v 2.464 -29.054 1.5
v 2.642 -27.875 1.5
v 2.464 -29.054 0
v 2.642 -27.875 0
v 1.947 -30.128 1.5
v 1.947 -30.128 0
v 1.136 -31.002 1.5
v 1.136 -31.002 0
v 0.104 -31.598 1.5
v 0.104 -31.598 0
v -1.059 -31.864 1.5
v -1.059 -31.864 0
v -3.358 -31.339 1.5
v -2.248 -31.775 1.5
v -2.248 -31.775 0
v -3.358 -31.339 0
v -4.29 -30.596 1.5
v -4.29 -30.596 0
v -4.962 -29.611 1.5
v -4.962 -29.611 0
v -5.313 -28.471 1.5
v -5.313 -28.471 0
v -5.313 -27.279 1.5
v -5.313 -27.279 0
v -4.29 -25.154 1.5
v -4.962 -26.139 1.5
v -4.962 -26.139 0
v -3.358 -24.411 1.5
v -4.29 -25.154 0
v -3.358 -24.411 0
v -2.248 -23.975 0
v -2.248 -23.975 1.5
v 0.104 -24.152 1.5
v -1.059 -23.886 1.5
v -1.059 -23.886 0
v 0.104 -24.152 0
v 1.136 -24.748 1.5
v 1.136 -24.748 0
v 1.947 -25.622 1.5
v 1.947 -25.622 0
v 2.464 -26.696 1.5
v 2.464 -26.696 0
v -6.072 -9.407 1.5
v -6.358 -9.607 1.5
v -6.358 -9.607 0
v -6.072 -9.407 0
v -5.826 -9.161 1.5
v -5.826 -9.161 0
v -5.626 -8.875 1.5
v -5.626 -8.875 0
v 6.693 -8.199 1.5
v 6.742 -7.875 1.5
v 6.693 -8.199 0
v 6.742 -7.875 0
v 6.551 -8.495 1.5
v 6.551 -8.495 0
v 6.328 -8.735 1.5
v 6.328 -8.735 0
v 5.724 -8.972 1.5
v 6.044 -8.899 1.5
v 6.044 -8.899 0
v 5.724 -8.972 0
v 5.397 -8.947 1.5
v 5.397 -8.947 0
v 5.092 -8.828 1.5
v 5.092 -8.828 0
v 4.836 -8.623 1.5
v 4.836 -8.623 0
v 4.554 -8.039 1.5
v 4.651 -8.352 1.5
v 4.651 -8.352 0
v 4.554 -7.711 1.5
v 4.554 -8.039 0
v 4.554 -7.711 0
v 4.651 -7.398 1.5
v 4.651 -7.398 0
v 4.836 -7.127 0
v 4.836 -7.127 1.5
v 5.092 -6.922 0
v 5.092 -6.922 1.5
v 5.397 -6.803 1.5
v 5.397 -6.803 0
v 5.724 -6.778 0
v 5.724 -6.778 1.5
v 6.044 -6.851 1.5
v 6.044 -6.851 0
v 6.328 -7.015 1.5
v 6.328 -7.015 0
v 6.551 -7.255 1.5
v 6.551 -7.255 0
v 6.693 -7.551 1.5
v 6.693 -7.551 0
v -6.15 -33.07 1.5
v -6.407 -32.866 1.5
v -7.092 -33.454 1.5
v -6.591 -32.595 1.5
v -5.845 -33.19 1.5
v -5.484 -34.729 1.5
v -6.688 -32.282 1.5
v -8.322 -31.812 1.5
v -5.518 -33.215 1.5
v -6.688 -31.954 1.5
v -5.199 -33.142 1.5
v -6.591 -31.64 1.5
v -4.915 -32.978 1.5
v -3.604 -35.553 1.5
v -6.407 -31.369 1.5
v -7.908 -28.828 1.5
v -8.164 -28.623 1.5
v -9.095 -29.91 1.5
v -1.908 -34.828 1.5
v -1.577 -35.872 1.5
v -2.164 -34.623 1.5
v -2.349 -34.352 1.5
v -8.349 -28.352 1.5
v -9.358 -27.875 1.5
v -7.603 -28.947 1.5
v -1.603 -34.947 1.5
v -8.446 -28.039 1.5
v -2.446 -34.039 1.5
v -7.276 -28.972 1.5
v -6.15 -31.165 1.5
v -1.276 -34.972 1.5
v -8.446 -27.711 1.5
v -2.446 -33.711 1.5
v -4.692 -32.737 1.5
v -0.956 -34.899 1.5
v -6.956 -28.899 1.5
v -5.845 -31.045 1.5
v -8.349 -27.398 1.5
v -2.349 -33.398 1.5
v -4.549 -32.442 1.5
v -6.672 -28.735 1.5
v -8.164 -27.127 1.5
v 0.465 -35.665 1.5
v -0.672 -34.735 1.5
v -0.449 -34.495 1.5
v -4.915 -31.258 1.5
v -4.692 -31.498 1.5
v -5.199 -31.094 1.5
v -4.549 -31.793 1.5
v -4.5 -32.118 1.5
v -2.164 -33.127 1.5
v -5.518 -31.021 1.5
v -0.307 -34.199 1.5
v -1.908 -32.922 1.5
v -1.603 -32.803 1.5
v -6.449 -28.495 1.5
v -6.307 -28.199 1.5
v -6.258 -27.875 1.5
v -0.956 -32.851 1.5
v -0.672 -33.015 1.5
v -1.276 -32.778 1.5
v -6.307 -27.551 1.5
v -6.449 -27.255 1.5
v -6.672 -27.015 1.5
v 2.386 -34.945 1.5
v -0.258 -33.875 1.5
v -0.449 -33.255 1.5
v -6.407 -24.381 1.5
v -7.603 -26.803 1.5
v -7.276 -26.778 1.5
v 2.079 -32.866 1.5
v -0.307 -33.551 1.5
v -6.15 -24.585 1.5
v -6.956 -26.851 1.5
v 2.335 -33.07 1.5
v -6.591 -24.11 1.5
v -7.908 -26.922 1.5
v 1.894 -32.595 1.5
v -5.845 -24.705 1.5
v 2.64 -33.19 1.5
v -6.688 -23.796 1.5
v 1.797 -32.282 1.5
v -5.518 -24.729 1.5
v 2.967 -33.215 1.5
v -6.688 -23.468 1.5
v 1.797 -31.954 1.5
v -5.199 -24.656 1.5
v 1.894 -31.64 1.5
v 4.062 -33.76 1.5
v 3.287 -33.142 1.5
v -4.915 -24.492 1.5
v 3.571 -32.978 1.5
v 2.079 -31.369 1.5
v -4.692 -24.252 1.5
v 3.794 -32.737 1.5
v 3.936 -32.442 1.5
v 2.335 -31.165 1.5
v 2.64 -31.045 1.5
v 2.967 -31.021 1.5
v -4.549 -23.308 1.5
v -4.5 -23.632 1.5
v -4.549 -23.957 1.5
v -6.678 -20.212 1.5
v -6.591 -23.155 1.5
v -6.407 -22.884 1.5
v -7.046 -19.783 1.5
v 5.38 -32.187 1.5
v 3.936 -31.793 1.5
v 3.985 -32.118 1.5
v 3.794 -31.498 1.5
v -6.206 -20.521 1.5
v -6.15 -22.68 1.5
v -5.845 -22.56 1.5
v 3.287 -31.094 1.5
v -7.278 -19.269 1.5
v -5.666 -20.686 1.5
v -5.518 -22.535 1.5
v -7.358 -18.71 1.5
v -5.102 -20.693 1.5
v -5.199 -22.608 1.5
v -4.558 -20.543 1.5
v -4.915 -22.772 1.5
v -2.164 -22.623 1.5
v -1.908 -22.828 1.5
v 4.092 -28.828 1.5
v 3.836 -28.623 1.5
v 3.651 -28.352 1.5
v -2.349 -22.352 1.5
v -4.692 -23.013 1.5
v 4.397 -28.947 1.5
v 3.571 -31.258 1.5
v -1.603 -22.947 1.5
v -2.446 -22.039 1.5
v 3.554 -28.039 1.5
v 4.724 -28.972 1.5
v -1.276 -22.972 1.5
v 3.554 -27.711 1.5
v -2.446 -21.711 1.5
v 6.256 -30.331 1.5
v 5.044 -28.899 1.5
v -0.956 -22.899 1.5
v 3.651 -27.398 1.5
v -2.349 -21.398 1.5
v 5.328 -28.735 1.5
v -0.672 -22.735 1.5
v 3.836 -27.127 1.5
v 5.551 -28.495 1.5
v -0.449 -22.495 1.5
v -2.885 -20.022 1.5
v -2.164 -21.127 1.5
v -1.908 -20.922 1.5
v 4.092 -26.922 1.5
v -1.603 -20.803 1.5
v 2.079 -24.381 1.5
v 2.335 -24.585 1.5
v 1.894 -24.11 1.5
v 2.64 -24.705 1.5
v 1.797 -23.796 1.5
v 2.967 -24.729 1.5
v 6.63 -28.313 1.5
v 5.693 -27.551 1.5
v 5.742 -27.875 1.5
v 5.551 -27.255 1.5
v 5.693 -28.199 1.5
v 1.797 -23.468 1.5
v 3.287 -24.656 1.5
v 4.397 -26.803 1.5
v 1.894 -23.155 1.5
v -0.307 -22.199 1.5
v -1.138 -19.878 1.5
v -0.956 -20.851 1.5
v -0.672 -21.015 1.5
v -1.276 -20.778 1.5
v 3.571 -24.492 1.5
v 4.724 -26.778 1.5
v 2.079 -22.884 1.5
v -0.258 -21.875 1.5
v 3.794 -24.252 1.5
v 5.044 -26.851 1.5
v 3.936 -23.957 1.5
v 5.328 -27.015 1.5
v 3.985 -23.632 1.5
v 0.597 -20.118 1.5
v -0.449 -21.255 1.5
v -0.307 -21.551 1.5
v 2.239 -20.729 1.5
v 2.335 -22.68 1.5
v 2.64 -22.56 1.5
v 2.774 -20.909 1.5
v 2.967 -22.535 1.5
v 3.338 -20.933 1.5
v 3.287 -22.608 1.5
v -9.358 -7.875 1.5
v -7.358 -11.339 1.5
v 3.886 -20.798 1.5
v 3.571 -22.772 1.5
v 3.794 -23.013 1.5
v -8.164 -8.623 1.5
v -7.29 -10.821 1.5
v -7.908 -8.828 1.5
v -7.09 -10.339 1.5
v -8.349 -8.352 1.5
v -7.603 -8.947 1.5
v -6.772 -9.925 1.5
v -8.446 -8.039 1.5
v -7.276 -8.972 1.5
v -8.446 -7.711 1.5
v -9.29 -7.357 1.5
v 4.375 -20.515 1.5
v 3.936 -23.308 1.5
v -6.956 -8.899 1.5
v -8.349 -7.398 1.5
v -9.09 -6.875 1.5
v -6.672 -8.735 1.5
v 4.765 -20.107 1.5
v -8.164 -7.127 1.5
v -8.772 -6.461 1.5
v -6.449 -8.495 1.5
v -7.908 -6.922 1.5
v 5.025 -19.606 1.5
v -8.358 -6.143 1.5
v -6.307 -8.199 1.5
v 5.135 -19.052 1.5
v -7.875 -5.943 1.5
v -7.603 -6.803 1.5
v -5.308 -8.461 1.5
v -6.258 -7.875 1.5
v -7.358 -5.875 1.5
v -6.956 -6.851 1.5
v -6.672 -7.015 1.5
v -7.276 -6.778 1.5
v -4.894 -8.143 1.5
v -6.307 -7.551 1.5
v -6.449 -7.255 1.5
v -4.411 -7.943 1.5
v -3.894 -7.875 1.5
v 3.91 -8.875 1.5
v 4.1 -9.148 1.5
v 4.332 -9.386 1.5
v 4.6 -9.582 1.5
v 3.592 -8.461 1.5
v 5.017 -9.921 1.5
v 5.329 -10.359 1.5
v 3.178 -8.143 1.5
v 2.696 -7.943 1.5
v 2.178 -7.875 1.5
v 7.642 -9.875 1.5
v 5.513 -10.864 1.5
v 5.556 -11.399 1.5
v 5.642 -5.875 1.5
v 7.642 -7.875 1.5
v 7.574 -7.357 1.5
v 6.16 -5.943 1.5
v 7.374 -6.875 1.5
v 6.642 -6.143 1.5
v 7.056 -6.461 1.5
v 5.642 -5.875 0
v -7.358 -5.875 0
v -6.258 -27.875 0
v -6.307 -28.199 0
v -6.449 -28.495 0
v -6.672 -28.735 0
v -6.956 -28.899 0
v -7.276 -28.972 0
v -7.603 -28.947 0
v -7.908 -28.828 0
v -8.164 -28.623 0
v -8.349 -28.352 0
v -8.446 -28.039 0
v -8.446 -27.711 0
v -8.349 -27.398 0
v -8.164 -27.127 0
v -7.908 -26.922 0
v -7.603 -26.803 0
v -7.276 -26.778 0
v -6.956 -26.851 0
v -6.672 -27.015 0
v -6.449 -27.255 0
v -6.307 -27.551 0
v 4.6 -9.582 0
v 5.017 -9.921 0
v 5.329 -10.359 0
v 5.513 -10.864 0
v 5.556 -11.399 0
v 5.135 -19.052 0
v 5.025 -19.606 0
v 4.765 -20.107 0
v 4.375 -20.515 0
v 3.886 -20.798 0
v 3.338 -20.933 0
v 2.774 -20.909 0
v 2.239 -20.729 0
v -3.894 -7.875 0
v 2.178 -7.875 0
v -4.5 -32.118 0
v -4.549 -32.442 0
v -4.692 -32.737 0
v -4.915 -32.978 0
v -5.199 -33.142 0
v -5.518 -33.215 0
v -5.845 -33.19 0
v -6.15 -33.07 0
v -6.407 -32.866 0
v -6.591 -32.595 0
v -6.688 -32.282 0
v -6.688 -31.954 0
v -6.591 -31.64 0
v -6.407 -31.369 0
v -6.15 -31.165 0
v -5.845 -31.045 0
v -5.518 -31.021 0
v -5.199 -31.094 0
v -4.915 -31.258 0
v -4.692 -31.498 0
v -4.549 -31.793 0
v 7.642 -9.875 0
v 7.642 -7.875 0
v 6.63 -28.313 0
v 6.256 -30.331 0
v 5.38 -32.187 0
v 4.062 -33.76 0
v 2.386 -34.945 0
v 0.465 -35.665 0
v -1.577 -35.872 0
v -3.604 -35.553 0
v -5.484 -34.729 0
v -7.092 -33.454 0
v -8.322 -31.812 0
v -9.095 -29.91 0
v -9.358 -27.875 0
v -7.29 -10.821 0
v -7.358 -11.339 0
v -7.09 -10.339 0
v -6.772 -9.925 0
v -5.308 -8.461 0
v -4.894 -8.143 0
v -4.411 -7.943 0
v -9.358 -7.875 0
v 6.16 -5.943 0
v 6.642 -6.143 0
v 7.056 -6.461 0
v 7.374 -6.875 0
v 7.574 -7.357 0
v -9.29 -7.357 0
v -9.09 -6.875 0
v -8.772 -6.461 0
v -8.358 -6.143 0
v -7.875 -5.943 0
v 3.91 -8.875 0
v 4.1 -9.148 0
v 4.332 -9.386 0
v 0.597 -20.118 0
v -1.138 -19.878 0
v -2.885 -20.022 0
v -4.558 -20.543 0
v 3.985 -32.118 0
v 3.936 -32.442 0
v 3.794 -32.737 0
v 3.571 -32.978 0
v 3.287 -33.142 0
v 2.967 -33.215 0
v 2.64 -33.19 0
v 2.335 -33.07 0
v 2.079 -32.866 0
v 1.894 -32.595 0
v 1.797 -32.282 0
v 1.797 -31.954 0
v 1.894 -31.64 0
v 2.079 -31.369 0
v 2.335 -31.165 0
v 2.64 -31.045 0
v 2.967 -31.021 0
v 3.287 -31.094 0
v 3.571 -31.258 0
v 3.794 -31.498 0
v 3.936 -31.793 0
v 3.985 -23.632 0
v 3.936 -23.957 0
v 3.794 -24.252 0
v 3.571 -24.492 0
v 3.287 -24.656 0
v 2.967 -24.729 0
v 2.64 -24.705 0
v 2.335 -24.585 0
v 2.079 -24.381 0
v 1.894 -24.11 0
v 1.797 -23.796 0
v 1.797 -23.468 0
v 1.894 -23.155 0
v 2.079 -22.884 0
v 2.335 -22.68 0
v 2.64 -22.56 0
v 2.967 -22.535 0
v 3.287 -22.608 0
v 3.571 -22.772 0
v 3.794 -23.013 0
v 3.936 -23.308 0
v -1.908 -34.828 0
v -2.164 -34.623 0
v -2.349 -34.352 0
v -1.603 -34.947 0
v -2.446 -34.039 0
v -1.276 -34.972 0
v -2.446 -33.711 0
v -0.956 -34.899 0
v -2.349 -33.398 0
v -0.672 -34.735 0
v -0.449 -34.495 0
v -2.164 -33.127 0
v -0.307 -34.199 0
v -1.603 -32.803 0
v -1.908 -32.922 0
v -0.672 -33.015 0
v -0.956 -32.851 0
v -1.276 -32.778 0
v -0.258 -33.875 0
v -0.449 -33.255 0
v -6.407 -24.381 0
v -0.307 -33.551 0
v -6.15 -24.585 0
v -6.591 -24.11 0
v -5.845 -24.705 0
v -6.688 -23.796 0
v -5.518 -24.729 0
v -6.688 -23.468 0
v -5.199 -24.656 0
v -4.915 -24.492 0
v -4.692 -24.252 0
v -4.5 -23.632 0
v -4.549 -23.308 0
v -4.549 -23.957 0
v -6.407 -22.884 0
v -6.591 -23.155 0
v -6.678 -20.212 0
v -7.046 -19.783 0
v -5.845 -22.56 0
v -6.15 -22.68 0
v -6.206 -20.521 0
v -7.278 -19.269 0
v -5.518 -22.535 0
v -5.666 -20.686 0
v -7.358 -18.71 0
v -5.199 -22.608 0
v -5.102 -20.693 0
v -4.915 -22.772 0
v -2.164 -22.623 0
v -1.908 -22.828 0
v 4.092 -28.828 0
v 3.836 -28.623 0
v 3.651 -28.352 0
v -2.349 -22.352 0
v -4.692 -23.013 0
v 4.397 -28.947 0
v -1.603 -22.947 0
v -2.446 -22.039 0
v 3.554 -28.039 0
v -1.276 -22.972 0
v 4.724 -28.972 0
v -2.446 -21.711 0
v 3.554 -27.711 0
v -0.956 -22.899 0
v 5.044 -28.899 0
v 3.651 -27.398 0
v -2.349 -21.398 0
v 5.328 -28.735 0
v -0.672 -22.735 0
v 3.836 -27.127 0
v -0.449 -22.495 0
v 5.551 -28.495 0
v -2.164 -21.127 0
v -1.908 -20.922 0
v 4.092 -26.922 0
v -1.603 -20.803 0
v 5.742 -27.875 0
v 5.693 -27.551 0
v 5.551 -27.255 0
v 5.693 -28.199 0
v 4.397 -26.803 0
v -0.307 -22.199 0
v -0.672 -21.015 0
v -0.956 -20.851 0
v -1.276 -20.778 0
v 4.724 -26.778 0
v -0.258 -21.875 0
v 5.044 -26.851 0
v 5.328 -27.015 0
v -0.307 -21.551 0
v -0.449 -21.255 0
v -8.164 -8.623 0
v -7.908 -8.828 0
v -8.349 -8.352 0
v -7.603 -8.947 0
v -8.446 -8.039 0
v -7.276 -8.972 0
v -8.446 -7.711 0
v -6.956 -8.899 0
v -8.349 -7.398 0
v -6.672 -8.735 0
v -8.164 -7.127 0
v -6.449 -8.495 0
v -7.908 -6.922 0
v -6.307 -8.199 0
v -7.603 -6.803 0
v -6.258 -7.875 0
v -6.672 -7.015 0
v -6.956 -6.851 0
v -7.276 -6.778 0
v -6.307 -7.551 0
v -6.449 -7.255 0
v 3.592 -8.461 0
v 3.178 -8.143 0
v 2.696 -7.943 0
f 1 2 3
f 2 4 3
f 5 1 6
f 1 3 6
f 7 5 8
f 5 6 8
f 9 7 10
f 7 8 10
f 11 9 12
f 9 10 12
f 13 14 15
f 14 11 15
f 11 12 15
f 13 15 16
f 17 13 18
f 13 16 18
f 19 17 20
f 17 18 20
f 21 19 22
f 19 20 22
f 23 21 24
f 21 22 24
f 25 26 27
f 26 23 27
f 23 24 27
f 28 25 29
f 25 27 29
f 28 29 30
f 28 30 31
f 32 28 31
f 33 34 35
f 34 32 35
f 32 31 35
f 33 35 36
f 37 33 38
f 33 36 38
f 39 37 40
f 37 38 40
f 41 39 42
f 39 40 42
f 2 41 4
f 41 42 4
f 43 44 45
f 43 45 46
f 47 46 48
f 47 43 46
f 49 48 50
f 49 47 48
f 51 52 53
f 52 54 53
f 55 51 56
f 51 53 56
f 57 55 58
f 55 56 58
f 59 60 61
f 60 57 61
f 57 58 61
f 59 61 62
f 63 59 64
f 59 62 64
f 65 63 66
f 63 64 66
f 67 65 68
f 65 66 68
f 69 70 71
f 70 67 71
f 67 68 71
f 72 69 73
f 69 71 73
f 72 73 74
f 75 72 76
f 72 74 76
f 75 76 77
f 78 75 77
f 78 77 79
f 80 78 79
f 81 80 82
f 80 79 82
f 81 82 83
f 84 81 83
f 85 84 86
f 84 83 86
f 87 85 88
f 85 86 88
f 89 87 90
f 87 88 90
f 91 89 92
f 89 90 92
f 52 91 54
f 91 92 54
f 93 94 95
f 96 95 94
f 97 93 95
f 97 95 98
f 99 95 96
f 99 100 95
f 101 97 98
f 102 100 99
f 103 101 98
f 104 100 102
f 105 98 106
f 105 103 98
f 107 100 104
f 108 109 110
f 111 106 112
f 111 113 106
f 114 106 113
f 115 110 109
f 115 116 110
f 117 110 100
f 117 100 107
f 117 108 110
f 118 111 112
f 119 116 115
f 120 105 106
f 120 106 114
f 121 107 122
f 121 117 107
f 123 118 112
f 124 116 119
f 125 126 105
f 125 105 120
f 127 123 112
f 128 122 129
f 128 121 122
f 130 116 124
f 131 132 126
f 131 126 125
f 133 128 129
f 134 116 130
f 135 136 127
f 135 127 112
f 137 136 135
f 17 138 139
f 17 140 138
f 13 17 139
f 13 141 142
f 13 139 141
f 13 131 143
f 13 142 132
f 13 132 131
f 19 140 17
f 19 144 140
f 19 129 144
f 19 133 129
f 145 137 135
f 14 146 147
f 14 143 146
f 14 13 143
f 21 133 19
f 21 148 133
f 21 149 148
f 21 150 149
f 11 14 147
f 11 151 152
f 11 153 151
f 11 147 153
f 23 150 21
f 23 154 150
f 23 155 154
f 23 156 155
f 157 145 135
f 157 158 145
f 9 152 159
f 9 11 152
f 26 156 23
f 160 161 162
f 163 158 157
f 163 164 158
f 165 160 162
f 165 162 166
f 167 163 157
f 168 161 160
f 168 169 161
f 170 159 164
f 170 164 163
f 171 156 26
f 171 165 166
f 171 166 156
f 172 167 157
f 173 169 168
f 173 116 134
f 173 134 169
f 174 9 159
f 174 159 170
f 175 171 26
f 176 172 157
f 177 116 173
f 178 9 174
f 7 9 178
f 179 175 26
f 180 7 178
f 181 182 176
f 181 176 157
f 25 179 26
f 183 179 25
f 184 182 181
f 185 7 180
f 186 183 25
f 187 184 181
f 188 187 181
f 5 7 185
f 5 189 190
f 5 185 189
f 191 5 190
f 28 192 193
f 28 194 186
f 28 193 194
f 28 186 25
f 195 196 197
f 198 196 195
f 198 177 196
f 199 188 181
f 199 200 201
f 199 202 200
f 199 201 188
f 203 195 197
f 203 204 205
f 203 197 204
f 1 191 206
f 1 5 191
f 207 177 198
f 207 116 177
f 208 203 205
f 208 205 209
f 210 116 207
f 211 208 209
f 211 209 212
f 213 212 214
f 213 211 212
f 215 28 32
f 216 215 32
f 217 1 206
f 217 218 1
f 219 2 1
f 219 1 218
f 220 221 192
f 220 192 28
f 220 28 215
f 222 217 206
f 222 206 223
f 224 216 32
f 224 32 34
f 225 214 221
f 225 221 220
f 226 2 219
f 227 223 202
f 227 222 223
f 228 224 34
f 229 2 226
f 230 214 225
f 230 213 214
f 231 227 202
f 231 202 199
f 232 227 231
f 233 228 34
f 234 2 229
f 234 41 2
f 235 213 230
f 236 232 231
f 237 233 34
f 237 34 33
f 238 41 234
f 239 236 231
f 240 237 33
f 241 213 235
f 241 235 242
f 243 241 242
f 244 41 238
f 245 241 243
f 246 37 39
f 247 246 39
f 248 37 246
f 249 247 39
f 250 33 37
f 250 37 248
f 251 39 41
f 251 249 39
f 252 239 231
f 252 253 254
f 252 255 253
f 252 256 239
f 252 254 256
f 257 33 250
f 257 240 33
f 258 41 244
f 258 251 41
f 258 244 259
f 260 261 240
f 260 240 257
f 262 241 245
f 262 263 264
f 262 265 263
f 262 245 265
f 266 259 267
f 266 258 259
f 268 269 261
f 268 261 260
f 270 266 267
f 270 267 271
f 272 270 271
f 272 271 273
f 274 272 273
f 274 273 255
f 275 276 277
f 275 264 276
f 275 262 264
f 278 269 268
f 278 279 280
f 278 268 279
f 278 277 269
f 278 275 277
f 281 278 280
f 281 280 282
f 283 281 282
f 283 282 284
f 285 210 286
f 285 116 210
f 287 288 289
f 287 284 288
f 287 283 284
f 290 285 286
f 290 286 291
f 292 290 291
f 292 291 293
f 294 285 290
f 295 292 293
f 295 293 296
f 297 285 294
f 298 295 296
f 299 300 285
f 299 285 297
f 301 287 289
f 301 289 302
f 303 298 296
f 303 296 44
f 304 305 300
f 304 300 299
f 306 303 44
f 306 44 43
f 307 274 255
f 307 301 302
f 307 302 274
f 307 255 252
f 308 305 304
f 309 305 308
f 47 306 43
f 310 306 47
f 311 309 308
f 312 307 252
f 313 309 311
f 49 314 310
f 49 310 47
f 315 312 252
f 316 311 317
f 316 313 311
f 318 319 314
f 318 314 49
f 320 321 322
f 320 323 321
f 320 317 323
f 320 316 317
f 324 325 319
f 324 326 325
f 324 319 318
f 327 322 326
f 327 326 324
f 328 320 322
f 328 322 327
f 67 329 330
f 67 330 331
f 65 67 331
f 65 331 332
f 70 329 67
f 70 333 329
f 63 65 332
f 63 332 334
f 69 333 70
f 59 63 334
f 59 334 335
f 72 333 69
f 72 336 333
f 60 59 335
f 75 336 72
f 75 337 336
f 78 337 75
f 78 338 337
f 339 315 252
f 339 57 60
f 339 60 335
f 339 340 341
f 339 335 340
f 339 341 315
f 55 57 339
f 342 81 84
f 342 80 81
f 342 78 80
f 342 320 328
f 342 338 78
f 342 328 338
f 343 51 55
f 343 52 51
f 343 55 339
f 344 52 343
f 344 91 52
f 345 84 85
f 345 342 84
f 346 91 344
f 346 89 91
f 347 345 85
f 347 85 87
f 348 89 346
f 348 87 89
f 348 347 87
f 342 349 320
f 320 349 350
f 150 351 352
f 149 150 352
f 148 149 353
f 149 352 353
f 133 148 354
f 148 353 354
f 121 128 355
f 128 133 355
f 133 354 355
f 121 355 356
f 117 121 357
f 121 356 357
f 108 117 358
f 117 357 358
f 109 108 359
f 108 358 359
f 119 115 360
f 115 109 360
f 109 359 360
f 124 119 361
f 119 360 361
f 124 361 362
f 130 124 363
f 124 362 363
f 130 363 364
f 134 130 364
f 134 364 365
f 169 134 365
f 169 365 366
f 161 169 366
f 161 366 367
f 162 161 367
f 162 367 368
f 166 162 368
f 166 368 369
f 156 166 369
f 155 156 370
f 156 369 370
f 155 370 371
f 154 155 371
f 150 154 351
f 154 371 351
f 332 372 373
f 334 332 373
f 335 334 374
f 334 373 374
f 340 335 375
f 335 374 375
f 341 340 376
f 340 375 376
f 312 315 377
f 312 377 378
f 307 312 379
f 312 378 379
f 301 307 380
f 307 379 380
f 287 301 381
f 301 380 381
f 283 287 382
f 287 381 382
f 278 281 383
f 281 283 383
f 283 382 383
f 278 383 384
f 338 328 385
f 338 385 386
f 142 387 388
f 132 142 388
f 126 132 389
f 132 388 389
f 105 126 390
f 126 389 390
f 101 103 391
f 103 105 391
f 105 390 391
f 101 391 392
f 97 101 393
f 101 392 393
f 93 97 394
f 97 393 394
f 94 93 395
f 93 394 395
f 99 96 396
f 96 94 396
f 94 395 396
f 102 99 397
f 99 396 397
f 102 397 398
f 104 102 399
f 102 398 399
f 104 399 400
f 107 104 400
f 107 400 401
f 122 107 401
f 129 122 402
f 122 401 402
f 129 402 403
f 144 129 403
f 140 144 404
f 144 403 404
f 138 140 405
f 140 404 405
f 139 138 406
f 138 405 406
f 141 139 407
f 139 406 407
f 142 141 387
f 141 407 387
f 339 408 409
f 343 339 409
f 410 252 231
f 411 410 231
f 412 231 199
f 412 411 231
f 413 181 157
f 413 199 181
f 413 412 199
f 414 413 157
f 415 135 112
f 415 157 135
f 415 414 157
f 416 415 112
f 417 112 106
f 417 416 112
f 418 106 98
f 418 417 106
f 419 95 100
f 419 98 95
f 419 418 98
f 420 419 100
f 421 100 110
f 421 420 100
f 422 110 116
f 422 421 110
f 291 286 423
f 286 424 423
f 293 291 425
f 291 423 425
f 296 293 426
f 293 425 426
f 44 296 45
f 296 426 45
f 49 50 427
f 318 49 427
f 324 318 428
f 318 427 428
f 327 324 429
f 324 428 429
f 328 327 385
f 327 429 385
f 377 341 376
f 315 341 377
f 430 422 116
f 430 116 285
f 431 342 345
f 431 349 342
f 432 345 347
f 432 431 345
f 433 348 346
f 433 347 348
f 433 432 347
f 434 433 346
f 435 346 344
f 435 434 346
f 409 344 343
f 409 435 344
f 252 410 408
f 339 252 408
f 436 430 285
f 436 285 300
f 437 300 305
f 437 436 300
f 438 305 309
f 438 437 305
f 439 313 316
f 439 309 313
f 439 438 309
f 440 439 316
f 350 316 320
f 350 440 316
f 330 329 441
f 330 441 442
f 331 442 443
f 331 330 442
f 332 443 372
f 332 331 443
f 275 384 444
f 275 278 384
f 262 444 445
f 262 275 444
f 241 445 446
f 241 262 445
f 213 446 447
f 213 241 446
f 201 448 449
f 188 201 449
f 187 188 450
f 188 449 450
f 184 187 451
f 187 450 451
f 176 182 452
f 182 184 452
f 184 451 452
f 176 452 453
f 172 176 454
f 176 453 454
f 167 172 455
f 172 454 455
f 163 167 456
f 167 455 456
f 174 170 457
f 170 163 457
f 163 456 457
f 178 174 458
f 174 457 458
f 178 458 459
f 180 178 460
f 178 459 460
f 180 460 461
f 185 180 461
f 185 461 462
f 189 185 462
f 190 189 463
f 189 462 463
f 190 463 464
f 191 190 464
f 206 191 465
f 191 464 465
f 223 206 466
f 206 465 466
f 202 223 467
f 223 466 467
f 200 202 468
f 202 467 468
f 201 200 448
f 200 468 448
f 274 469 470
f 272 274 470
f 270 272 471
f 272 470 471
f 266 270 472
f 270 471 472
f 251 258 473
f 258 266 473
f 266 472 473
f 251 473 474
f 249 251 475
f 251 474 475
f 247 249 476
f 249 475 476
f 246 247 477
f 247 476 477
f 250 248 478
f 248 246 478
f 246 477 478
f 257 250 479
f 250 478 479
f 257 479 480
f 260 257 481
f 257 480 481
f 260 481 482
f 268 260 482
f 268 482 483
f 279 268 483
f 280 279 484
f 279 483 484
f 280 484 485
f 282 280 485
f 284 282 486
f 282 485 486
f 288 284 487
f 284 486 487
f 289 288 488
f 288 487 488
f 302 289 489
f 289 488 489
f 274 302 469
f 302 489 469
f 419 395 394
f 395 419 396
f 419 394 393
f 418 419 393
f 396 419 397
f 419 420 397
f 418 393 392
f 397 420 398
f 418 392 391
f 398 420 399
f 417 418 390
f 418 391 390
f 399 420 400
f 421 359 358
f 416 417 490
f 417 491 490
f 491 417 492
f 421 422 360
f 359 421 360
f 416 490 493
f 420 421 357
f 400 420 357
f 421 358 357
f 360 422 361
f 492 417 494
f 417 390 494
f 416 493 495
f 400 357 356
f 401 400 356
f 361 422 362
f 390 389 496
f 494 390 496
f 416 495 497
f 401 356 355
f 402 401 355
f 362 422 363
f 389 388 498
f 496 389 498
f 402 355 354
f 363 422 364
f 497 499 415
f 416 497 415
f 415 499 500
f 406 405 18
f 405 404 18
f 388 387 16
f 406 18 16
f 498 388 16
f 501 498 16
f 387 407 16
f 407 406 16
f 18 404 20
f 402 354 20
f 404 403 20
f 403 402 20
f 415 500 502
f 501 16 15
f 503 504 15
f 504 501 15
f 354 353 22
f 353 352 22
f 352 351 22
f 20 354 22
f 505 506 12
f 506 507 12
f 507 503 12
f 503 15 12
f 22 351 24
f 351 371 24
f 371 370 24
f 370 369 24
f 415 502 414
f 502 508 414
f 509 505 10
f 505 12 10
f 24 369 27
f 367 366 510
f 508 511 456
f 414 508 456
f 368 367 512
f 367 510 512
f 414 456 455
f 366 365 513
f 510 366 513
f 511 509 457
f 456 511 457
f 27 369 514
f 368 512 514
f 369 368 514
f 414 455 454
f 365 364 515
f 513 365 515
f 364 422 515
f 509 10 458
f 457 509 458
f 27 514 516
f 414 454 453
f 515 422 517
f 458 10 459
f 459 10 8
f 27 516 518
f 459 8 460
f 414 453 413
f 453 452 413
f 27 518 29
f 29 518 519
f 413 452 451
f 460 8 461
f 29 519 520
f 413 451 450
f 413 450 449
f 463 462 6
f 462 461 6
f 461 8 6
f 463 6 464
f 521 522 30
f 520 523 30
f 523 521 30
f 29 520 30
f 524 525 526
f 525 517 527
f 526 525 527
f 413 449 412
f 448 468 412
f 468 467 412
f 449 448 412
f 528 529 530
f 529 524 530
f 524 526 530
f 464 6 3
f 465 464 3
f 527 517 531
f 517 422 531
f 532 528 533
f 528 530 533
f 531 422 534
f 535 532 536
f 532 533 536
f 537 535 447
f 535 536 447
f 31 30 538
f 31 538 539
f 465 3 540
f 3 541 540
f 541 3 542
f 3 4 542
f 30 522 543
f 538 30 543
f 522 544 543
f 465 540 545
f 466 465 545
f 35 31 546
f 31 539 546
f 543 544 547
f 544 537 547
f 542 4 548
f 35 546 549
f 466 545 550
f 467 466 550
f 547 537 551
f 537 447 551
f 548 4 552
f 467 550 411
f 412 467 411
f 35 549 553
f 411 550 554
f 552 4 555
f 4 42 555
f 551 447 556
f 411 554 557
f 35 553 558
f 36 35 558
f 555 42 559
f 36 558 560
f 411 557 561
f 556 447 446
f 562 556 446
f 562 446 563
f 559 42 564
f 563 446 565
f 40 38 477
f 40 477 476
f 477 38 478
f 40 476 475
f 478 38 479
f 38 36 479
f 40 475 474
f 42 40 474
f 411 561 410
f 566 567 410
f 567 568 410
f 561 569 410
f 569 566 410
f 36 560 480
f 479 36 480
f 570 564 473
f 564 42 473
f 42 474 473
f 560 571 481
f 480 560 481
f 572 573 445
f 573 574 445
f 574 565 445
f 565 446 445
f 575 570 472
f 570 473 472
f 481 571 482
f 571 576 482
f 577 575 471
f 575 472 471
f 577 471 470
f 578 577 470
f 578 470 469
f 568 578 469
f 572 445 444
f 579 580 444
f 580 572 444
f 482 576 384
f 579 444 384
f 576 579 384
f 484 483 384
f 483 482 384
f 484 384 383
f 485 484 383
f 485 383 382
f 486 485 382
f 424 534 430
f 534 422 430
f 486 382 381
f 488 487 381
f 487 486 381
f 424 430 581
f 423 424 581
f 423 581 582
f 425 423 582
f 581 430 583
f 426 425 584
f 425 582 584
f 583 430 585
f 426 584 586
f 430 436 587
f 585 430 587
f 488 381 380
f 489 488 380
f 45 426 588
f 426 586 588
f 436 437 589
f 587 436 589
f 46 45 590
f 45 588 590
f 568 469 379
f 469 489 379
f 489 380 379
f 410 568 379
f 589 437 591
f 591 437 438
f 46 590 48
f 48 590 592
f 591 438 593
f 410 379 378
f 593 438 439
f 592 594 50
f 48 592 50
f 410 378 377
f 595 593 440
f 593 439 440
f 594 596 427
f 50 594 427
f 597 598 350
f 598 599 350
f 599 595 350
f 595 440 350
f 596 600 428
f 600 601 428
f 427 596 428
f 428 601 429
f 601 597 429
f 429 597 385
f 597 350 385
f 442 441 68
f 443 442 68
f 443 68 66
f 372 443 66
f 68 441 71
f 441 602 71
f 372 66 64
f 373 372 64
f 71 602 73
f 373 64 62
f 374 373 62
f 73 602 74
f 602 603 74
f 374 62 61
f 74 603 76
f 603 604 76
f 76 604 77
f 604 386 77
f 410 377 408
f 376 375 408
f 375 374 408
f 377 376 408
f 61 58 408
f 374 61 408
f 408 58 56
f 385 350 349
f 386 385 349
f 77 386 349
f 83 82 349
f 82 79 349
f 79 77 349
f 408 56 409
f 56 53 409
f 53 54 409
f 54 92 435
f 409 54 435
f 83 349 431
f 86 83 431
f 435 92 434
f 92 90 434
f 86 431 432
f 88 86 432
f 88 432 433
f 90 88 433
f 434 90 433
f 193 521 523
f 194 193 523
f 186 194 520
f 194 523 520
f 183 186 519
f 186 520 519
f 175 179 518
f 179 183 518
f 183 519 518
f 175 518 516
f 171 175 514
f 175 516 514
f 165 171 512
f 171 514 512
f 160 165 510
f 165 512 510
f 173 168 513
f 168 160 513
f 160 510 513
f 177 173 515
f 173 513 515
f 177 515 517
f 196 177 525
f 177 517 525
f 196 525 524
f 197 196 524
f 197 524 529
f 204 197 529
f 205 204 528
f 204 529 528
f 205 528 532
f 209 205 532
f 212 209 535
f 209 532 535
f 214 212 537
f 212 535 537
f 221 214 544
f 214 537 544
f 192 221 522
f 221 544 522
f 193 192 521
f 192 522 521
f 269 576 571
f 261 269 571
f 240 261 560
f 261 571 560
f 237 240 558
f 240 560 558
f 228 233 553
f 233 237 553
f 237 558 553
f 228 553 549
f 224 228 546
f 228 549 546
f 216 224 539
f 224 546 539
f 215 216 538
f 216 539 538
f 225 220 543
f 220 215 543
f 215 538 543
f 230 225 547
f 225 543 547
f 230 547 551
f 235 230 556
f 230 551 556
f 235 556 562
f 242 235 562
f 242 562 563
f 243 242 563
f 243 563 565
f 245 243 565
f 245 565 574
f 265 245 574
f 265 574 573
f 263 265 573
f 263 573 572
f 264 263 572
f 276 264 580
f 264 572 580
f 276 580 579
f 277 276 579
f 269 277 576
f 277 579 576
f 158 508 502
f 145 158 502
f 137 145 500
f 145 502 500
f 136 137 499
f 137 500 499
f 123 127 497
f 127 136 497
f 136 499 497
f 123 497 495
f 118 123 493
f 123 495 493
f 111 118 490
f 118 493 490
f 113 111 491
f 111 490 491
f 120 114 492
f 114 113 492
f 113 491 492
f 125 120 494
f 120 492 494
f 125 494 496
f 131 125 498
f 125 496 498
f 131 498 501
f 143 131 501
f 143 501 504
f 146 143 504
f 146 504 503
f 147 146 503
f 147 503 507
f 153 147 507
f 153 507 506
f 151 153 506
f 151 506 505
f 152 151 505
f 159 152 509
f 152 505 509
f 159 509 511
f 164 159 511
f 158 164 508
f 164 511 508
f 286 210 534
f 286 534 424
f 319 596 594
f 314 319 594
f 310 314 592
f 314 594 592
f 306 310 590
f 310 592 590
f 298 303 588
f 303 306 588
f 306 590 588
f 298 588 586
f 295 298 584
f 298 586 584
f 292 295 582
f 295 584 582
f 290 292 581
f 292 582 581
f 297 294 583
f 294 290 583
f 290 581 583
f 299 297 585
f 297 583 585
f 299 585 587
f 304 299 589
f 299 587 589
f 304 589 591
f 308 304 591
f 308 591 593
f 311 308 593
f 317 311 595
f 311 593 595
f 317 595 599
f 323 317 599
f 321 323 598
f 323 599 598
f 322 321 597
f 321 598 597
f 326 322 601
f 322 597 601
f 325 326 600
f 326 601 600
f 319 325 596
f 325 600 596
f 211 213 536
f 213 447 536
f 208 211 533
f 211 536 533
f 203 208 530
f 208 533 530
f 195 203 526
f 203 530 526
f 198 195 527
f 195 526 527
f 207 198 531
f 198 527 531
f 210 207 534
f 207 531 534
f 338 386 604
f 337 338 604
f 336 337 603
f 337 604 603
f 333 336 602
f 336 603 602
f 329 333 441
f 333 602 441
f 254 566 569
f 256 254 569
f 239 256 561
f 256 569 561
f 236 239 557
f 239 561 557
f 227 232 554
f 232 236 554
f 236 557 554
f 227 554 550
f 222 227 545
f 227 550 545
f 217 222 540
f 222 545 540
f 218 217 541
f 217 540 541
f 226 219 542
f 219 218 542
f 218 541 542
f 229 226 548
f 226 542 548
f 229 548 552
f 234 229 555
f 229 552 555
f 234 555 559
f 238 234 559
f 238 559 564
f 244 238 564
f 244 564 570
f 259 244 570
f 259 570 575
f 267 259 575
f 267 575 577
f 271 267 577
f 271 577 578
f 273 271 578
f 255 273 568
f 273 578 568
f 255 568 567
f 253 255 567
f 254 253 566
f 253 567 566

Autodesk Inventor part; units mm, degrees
ref_plane "YZ Plane" through (0, 0, 0) normal (1, 0, 0) x (0, 1, 0)
ref_plane "XZ Plane" through (0, 0, 0) normal (0, 1, 0) x (-1, 0, 0)
ref_plane "XY Plane" through (0, 0, 0) normal (0, 0, 1) x (1, 0, 0)
sketch "スケッチ1" plane through (0, 0, 0) normal (0, 0, 1) x (1, 0, 0)
  circle A0 centre (5.6422, -7.875) radius 1 projected
  circle A1 centre (-7.3578, -7.875) radius 1 projected
  circle A2 centre (5.6422, -7.875) radius 1.1
  circle A3 centre (-7.3578, -7.875) radius 1.1
  circle A4 centre (-1.3578, -27.875) radius 4.1 projected
  circle A5 centre (-1.3578, -27.875) radius 4
  circle A6 centre (4.6422, -27.875) radius 1.1
  circle A7 centre (-1.3578, -27.875) radius 6 construction
  circle A8 centre (2.8849, -23.6324) radius 1.1
  circle A9 centre (-1.3578, -21.875) radius 1.1
  circle A10 centre (-5.6004, -23.6324) radius 1.1
  circle A11 centre (-7.3578, -27.875) radius 1.1
  circle A12 centre (-5.6004, -32.1176) radius 1.1
  circle A13 centre (-1.3578, -33.875) radius 1.1
  circle A14 centre (2.8849, -32.1176) radius 1.1
  line L0 (7.6422, -5.875) -> (-9.3578, -5.875)
  line L1 (-9.3578, -5.875) -> (-9.3578, -9.875)
  line L2 (-9.3578, -9.875) -> (7.6422, -9.875)
  line L3 (7.6422, -9.875) -> (7.6422, -5.875)
  circle A15 centre (-1.3578, -27.875) radius 8
  line L4 (6.6302, -28.3134) -> (7.6422, -9.875)
  line L5 (-9.3578, -27.875) -> (-9.3578, -9.875)
  circle A16 centre (5.6422, -7.875) radius 2
  circle A17 centre (-7.3578, -7.875) radius 2
  point P0 (0, 0)
  point P1 (5.6422, -5.875)
  point P2 (-7.3578, -5.875)
  point P3 (-9.3578, -7.875)
  point P4 (7.6422, -7.875)
  dimension "d4" = 12
  dimension "d0" = 2.2
  dimension "d1" = 2.2
  dimension "d2" = 8
  dimension "d3" = 2.2
  dimension "d7" = 360
  dimension "d9" = 16
  dimension "d10" = 4
  dimension "d11" = 4
extrude "押し出し1" add sketch "スケッチ1" along normal blind 1.5 contours A4 | A16 L2 A17 L0 | A16 | L3 L2 A16 | A17 | L2 L4 A15 L5 | A17 L2 L1 | A15
sketch "スケッチ2" plane through (0, 0, 1.5) normal (0, 0, 1) x (1, 0, 0)
  arc A0 (-7.3578, -5.875) -> (-9.3578, -7.875) centre (-7.3578, -7.875) ccw projected
  line L0 (-9.3578, -7.875) -> (-9.3578, -27.875) projected
  arc A1 (-9.3578, -27.875) -> (6.6302, -28.3134) centre (-1.3578, -27.875) ccw projected
  line L1 (6.6302, -28.3134) -> (7.6422, -9.875) projected
  line L2 (7.6422, -9.875) -> (7.6422, -7.875) projected
  arc A2 (7.6422, -7.875) -> (5.6422, -5.875) centre (5.6422, -7.875) ccw projected
  line L3 (5.6422, -5.875) -> (-7.3578, -5.875) projected
  circle A3 centre (4.6422, -27.875) radius 1.1 projected
  circle A4 centre (2.8849, -23.6324) radius 1.1 projected
  circle A5 centre (-1.3578, -21.875) radius 1.1 projected
  circle A6 centre (-5.6004, -23.6324) radius 1.1 projected
  circle A7 centre (-7.3578, -27.875) radius 1.1 projected
  circle A8 centre (-5.6004, -32.1176) radius 1.1 projected
  circle A9 centre (-1.3578, -33.875) radius 1.1 projected
  circle A10 centre (2.8849, -32.1176) radius 1.1 projected
  circle A11 centre (-1.3578, -27.875) radius 4 projected
  circle A12 centre (5.6422, -7.875) radius 1.1 projected
  circle A13 centre (-7.3578, -7.875) radius 1.1 projected
  line L4 (5.6422, -9.8202) -> (4.6332, -28.2038)
  arc A14 (-7.3578, -27.875) -> (4.6332, -28.2038) centre (-1.3578, -27.875) ccw
  line L5 (-7.3578, -27.875) -> (-7.3578, -7.875)
  line L6 (-7.3578, -7.875) -> (5.6422, -7.875)
  line L7 (5.6422, -7.875) -> (5.6422, -9.8202)
  circle A15 centre (5.6422, -7.875) radius 2
  circle A16 centre (-7.3578, -7.875) radius 2
  circle A17 centre (-1.3578, -27.875) radius 8
  point P0 (0, 0)
  point P1 (-7.3578, -22.5835)
  point P2 (4.9232, -22.9203)
  point P3 (5.6392, -9.875)
  point P4 (3.6422, -7.875)
  point P5 (-5.3578, -7.875)
  point P6 (-7.3578, -9.875)
  dimension "d14" = 2
  dimension "d15" = 16
extrude "押し出し2" cut sketch "スケッチ2" against normal through all contours L6 A15 L4 A17 L5 A16
fillet "フィレット1" radius 2 6 edges at (4.9232, -22.9203, 0.75) (-7.3578, -22.5835, 0.75) (-7.3578, -9.875, 0.75) (-5.3578, -7.875, 0.75) (5.6392, -9.875, 0.75) (3.6422, -7.875, 0.75)
properties part number "newnewude_2" material "アルミニウム 2014-T4"
